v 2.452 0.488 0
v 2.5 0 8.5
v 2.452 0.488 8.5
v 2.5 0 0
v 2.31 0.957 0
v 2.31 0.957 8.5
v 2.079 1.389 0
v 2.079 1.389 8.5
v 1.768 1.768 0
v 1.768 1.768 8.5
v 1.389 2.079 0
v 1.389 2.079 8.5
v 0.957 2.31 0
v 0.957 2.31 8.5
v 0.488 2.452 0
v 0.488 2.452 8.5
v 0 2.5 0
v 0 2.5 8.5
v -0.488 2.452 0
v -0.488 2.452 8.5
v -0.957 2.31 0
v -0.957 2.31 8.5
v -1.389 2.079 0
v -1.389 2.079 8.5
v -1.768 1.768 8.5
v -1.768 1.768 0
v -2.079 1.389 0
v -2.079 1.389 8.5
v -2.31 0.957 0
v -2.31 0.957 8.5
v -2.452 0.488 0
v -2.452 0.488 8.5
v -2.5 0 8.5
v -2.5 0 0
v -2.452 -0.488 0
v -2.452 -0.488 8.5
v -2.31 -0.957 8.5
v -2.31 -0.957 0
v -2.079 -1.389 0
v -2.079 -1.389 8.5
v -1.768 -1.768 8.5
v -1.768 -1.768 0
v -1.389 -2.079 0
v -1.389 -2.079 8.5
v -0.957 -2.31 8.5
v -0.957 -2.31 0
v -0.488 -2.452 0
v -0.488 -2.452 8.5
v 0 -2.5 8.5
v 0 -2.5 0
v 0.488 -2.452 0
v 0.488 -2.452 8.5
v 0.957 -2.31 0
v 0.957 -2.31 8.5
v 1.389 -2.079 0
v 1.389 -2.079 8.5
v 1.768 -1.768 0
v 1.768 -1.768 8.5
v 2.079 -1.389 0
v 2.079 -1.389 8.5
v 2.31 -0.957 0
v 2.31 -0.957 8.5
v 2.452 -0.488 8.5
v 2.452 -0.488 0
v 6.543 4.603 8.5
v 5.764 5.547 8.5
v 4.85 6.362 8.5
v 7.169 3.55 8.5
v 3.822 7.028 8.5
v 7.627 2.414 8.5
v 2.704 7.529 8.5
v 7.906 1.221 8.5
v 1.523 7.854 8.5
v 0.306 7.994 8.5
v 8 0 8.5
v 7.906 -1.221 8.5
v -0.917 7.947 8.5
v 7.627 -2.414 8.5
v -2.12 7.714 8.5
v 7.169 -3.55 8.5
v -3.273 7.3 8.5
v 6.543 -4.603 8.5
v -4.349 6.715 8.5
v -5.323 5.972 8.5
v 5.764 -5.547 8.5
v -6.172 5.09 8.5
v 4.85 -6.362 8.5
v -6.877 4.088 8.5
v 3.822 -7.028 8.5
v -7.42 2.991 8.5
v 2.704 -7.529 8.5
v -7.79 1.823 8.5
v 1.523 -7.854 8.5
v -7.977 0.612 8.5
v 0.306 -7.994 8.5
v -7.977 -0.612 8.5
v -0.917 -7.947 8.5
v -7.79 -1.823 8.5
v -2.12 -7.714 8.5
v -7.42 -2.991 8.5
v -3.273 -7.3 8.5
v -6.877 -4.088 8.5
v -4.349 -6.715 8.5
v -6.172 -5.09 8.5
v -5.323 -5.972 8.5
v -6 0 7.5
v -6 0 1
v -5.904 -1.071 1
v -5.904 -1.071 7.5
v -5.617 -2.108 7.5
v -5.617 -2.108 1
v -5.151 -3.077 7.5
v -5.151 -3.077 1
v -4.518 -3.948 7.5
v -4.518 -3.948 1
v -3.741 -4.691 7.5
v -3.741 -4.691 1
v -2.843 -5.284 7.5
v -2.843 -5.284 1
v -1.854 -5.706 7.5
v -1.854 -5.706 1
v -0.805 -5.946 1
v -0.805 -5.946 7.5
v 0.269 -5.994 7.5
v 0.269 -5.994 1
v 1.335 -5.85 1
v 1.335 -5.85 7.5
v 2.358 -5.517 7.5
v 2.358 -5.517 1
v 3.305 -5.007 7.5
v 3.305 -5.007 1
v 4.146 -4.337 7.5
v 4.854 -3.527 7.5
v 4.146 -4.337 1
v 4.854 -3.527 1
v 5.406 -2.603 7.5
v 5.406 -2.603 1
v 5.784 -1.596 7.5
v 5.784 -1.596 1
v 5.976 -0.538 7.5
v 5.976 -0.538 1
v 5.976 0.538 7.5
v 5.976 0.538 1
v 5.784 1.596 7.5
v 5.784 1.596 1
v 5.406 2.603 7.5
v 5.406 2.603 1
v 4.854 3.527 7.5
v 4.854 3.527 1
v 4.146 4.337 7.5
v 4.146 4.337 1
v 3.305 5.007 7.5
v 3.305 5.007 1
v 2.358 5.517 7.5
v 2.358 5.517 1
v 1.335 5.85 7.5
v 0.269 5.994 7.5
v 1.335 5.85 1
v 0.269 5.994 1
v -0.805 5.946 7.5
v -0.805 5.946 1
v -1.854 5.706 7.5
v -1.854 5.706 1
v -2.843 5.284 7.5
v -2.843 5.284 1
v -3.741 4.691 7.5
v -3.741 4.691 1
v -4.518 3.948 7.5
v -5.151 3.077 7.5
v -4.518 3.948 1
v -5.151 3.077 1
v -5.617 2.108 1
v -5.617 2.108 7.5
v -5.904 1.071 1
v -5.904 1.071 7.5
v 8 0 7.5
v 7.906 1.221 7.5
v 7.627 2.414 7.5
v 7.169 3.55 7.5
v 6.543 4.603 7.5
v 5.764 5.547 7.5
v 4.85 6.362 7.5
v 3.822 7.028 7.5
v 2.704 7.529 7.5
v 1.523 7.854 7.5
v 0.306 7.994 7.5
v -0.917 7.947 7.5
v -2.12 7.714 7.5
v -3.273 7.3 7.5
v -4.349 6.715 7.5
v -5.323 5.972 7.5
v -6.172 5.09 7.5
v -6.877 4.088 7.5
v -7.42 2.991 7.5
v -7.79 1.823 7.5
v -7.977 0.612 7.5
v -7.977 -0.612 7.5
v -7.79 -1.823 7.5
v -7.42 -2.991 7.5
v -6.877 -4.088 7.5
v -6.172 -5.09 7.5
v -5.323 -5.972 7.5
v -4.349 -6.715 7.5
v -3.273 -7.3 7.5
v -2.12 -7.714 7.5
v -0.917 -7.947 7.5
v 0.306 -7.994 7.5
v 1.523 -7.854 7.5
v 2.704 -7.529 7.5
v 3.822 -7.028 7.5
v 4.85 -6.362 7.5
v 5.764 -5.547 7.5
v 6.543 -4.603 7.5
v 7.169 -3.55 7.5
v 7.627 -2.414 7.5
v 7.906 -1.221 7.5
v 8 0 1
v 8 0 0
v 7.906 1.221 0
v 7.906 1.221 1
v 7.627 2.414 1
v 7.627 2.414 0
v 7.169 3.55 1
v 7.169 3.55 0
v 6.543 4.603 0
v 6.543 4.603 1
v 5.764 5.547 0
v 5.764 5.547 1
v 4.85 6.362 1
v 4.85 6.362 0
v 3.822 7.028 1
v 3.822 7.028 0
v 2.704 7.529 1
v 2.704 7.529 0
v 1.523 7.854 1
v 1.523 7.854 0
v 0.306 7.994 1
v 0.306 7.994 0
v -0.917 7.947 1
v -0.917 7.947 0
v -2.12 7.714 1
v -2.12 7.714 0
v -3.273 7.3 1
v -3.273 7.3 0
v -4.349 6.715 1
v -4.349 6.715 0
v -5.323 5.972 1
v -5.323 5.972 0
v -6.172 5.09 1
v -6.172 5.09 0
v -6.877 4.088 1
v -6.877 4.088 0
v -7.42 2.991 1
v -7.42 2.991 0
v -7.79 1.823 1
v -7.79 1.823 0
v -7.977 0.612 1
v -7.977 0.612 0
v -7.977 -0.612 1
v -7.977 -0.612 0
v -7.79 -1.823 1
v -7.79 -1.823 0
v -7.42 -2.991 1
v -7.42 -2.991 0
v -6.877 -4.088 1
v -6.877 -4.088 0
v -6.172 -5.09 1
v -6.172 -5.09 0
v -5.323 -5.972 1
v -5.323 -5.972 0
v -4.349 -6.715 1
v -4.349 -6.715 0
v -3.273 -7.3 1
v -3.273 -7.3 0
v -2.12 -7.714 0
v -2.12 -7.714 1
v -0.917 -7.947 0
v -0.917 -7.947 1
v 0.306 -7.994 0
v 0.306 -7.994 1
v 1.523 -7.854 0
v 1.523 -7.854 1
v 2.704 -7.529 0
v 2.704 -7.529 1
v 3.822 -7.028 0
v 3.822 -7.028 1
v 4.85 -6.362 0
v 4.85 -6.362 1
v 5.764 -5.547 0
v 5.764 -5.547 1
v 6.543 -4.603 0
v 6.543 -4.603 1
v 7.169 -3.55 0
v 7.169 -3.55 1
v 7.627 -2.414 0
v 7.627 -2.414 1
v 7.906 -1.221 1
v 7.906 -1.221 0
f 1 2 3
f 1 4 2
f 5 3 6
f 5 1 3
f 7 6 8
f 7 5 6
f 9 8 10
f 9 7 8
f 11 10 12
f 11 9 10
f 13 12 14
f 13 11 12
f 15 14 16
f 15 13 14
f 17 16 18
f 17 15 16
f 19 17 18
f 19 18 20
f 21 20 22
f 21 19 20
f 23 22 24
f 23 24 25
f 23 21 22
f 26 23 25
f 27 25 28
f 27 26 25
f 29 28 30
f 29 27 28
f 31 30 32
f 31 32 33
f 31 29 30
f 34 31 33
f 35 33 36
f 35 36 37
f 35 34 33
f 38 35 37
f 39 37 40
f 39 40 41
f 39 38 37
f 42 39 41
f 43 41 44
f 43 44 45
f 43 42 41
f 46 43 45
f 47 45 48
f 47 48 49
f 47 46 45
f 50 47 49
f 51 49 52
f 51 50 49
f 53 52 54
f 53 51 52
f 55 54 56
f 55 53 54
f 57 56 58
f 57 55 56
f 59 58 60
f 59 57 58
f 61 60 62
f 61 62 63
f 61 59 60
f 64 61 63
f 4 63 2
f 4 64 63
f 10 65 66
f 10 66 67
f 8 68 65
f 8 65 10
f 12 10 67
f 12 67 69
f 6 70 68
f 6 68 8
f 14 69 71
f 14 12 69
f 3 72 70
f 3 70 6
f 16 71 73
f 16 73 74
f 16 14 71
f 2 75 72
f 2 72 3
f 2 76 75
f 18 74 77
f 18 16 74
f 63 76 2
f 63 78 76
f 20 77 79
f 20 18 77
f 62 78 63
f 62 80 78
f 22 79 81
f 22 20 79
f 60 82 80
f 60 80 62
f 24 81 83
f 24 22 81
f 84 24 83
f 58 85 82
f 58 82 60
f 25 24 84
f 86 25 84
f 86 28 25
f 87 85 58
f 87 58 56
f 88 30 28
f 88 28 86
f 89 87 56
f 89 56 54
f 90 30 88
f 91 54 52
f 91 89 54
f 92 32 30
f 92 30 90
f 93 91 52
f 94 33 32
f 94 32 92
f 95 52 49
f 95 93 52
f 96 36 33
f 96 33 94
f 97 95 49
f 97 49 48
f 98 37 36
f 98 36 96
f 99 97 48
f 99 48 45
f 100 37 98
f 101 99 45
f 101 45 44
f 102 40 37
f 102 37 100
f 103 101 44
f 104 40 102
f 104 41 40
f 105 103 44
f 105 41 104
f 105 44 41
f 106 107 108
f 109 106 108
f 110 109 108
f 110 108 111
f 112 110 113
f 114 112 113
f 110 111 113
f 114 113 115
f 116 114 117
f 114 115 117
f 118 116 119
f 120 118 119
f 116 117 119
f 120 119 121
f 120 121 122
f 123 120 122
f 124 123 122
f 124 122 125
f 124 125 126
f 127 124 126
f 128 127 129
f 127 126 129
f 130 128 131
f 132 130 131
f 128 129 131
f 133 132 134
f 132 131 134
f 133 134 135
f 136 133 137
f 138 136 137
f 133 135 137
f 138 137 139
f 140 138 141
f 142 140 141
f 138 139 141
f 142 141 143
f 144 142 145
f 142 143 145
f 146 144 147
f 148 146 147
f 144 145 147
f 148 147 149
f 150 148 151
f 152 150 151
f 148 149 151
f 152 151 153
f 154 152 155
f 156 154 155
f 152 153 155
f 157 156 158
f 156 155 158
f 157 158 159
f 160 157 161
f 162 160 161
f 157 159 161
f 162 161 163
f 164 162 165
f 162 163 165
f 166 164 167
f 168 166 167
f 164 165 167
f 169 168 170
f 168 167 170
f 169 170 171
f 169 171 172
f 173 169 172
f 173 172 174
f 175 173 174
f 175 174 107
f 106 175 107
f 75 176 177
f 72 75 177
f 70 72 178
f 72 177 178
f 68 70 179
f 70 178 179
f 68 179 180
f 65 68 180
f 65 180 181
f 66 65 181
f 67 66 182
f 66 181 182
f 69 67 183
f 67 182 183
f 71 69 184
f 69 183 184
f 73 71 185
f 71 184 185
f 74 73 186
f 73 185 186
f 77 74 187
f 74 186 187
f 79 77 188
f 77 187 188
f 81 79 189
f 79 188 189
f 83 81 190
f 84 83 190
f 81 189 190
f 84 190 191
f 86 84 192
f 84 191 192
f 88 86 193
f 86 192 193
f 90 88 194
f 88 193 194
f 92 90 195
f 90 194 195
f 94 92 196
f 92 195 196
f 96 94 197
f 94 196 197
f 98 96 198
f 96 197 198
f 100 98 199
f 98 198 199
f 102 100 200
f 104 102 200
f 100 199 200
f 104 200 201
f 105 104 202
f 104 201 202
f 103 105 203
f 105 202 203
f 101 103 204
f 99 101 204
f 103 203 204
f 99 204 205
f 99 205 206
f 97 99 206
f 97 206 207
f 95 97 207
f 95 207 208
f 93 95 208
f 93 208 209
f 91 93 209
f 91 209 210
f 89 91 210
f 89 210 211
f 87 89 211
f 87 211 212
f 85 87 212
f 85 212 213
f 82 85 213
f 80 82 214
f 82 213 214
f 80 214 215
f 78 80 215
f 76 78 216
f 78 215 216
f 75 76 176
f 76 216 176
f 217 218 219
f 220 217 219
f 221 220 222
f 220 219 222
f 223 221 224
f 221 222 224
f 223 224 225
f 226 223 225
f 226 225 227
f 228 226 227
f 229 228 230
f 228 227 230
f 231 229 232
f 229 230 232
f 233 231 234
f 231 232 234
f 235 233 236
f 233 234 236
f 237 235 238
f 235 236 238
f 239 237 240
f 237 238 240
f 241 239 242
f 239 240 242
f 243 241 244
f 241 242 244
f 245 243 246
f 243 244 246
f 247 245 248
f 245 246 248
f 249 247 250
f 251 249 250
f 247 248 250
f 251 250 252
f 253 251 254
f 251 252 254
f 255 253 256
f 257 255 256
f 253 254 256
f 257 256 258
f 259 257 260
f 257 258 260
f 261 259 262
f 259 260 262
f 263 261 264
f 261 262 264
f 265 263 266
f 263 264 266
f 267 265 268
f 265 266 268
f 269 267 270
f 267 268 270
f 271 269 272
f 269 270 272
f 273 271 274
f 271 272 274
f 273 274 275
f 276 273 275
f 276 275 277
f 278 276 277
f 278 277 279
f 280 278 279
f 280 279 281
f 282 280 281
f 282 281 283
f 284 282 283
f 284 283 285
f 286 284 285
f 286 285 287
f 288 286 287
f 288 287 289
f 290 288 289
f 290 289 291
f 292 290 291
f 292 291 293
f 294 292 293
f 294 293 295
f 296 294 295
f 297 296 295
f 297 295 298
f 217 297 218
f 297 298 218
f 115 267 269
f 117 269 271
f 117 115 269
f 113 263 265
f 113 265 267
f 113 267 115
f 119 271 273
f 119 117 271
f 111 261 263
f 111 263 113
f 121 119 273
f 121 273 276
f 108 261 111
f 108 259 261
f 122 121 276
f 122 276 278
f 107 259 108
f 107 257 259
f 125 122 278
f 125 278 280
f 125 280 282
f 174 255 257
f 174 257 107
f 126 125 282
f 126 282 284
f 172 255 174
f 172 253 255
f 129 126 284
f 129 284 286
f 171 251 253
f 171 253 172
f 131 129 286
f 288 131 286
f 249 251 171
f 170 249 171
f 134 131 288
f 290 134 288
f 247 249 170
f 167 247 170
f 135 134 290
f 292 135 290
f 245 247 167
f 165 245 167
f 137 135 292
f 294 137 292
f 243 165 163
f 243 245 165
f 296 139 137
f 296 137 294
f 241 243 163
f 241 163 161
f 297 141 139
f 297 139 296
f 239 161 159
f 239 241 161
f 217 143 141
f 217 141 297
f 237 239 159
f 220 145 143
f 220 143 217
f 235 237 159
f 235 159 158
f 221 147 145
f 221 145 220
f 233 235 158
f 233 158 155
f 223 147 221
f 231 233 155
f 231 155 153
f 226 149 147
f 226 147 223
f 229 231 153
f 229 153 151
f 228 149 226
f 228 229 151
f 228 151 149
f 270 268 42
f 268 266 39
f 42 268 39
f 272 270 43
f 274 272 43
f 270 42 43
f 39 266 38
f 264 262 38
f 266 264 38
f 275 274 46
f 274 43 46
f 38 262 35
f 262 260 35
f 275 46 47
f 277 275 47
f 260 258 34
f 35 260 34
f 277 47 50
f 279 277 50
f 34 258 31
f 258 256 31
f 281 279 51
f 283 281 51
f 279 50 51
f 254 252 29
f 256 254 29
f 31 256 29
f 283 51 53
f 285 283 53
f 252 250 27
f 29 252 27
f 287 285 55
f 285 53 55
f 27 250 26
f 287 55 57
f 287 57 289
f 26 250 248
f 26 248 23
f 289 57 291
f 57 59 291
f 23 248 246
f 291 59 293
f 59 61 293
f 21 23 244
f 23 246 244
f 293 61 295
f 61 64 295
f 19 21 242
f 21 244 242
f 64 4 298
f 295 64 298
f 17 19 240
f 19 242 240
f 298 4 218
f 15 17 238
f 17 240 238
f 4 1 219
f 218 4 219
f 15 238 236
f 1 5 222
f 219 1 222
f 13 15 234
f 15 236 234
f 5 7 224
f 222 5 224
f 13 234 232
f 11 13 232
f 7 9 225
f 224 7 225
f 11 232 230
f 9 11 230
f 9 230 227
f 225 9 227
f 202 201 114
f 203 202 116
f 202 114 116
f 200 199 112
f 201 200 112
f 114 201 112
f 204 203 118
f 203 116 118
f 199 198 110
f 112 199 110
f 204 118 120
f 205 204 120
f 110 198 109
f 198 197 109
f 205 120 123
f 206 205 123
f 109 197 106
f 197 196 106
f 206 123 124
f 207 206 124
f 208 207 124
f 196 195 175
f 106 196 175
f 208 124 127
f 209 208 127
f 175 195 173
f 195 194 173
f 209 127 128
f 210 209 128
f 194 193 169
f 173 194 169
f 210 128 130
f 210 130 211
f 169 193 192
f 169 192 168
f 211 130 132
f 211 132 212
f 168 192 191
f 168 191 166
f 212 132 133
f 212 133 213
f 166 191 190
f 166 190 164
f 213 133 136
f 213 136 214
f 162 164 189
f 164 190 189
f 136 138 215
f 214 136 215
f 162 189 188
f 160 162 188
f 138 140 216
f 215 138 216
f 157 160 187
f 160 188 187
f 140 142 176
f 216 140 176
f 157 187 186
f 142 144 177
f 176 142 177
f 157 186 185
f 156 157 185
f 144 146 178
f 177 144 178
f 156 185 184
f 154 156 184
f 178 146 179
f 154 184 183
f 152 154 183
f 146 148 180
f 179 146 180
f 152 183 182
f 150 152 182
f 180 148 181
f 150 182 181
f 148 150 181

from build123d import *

# Parameters (mm, degrees)
SKETCH_1_R      = 8
SKETCH_1_R_2    = 2.5
EXTRUDE_1_DEPTH = 1
SKETCH_2_R      = 6
SKETCH_2_R_2    = 2.5
EXTRUDE_2_DEPTH = 6.5
SKETCH_3_R      = 8
SKETCH_3_R_2    = 6
EXTRUDE_3_DEPTH = 1
SKETCH_4_R      = 6
SKETCH_4_R_2    = 2.5
EXTRUDE_4_DEPTH = 1


with BuildPart() as part:
    # 草图1 → 凸台-拉伸1 (new body)
    with BuildSketch(Plane.XY):
        Circle(SKETCH_1_R)
        Circle(SKETCH_1_R_2, mode=Mode.SUBTRACT)
    extrude(amount=EXTRUDE_1_DEPTH)

    # 草图2 → 凸台-拉伸2 (add)
    with BuildSketch(Plane.XY.offset(1)):
        with Locations(Location((0, 0, 0), (0, 0, 180))):
            Circle(SKETCH_2_R)
        Circle(SKETCH_2_R_2, mode=Mode.SUBTRACT)
    extrude(amount=EXTRUDE_2_DEPTH)



with BuildPart() as body_2:
    # 草图3 → 凸台-拉伸3 (new body)
    with BuildSketch(Plane.XY.offset(7.5)):
        Circle(SKETCH_3_R)
        with Locations(Location((0, 0, 0), (0, 0, 180))):
            Circle(SKETCH_3_R_2, mode=Mode.SUBTRACT)
    extrude(amount=EXTRUDE_3_DEPTH)


with BuildPart() as part_1:
    add(part.part)

    add(body_2.part)  # 凸台-拉伸4 merges body 2
    # 草图4 → 凸台-拉伸4 (add)
    with BuildSketch(Plane.XY.offset(7.5)):
        with Locations(Location((0, 0, 0), (0, 0, 180))):
            Circle(SKETCH_4_R)
        Circle(SKETCH_4_R_2, mode=Mode.SUBTRACT)
    extrude(amount=EXTRUDE_4_DEPTH)


solid = part_1.part
